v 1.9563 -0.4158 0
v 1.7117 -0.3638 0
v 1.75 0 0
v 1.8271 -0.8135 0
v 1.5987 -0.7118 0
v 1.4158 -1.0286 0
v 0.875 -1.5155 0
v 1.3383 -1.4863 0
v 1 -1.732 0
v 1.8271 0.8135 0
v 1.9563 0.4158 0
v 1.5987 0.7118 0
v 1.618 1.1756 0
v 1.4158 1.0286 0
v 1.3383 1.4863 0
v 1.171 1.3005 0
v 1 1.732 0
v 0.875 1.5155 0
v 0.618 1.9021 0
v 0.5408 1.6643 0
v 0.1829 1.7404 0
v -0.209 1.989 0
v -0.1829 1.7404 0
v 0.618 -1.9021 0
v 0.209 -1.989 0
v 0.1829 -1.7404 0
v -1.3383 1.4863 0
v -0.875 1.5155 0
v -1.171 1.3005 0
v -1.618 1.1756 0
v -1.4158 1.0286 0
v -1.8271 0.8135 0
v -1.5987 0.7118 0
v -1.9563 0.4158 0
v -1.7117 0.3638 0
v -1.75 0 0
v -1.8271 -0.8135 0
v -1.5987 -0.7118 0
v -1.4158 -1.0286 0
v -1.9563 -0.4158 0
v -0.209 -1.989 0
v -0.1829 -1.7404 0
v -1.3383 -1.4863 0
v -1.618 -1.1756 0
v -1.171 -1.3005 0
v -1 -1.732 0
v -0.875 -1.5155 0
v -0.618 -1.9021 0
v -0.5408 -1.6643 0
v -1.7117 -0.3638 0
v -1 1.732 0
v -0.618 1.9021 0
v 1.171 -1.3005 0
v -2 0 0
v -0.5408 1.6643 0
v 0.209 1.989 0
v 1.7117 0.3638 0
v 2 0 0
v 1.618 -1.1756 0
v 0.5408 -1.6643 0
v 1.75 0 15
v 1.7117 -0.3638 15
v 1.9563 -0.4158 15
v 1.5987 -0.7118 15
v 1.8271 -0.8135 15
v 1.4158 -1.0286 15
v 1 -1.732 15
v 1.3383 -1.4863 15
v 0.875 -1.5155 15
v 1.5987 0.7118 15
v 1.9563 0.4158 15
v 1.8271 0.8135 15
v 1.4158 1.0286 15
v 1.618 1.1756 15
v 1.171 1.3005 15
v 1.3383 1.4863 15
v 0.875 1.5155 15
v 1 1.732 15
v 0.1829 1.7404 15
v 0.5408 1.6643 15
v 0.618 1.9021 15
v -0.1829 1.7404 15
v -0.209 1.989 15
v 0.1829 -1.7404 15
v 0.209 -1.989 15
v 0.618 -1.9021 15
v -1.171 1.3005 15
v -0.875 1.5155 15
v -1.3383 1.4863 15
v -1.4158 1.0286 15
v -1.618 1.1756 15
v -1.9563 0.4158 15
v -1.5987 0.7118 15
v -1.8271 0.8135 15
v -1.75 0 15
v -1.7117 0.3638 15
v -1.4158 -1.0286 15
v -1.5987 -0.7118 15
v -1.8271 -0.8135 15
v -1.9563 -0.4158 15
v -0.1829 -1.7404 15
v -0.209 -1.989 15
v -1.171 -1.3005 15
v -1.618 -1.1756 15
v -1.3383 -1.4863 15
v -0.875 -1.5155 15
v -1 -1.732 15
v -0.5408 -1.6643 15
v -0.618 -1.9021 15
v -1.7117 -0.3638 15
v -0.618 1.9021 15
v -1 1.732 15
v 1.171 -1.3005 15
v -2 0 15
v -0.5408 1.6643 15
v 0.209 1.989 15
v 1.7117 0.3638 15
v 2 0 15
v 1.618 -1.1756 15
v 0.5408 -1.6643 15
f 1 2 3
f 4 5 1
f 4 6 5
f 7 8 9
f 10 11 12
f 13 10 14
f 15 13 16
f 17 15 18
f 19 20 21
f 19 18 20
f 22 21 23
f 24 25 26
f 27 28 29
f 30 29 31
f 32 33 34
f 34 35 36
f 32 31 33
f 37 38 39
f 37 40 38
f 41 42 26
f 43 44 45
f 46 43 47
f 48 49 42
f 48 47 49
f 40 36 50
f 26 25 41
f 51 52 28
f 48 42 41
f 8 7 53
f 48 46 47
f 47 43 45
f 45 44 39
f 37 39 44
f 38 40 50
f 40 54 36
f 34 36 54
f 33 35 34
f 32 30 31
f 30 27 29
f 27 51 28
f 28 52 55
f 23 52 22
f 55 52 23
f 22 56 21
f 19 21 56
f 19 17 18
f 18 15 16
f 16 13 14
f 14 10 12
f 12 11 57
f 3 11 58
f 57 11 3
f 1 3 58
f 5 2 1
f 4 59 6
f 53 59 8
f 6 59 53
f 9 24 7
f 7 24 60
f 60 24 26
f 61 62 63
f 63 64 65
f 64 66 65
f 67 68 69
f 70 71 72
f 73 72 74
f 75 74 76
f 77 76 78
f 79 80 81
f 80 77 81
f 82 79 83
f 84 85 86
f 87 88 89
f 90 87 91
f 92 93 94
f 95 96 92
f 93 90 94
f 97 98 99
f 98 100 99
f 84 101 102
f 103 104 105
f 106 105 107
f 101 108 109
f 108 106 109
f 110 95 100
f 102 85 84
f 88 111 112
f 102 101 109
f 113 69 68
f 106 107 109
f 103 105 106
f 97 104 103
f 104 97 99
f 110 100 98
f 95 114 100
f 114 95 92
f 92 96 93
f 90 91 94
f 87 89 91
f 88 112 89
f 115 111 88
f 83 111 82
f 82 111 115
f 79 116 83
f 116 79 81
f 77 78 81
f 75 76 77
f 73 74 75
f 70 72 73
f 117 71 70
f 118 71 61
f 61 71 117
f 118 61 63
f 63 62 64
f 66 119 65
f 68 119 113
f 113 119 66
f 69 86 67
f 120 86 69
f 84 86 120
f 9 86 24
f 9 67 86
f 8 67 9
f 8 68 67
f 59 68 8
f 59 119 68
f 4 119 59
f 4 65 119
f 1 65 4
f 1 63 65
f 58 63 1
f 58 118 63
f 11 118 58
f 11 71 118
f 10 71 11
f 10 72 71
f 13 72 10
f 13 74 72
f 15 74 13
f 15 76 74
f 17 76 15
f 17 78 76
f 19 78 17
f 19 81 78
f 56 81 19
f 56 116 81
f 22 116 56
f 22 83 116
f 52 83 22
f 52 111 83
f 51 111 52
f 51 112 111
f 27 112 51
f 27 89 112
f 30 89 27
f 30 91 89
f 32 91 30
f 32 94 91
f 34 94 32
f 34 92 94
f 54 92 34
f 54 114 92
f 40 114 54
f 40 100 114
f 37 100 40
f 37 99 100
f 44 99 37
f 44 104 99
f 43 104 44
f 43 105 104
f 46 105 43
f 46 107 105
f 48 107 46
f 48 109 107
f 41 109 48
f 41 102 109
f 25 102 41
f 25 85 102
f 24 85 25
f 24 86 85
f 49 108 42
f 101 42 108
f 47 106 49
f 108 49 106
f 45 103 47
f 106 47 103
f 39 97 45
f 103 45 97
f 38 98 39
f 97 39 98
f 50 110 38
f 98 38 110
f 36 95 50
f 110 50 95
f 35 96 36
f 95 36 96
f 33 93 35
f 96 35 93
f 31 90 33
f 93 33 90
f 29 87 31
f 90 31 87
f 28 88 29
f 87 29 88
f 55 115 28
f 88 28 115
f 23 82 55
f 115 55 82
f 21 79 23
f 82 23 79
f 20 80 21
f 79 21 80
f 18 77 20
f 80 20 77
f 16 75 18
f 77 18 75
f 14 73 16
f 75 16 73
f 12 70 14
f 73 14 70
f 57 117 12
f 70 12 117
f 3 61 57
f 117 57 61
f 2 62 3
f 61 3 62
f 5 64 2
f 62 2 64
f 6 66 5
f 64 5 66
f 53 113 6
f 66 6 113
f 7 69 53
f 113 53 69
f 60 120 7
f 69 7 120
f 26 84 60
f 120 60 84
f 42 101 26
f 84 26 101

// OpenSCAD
module Pipe(){

    Pipe_Lenght = 15;
    Pipe_Dext = 4;
    Pipe_Dint = 3.5;

    color("#a8b0b2")
    linear_extrude(Pipe_Lenght, $fn = $preview? 90: 30) 

    difference(){
    circle(d = Pipe_Dext, $fn = $preview? 90: 30);
    circle(d = Pipe_Dint, $fn = $preview? 90: 30);
    }

}

Pipe();


// Written by Nicolì Angelo (Gengio) 2024: 
// MIT License

//Permission is hereby granted, free of charge, to any person obtaining a copy of this software and associated documentation files (the "Software"), to deal in the Software without restriction, including without limitation the rights to use, copy, modify, merge, publish, distribute, sublicense, and/or sell copies of the Software, and to permit persons to whom the Software is furnished to do so, subject to the following conditions:

//The above copyright notice and this permission notice shall be included in all copies or substantial portions of the Software.

//THE SOFTWARE IS PROVIDED "AS IS", WITHOUT WARRANTY OF ANY KIND, EXPRESS OR IMPLIED, INCLUDING BUT NOT LIMITED TO THE WARRANTIES OF MERCHANTABILITY, FITNESS FOR A PARTICULAR PURPOSE AND NONINFRINGEMENT. IN NO EVENT SHALL THE AUTHORS OR COPYRIGHT HOLDERS BE LIABLE FOR ANY CLAIM, DAMAGES OR OTHER LIABILITY, WHETHER IN AN ACTION OF CONTRACT, TORT OR OTHERWISE, ARISING FROM, OUT OF OR IN CONNECTION WITH THE SOFTWARE OR THE USE OR OTHER DEALINGS IN THE SOFTWARE.
